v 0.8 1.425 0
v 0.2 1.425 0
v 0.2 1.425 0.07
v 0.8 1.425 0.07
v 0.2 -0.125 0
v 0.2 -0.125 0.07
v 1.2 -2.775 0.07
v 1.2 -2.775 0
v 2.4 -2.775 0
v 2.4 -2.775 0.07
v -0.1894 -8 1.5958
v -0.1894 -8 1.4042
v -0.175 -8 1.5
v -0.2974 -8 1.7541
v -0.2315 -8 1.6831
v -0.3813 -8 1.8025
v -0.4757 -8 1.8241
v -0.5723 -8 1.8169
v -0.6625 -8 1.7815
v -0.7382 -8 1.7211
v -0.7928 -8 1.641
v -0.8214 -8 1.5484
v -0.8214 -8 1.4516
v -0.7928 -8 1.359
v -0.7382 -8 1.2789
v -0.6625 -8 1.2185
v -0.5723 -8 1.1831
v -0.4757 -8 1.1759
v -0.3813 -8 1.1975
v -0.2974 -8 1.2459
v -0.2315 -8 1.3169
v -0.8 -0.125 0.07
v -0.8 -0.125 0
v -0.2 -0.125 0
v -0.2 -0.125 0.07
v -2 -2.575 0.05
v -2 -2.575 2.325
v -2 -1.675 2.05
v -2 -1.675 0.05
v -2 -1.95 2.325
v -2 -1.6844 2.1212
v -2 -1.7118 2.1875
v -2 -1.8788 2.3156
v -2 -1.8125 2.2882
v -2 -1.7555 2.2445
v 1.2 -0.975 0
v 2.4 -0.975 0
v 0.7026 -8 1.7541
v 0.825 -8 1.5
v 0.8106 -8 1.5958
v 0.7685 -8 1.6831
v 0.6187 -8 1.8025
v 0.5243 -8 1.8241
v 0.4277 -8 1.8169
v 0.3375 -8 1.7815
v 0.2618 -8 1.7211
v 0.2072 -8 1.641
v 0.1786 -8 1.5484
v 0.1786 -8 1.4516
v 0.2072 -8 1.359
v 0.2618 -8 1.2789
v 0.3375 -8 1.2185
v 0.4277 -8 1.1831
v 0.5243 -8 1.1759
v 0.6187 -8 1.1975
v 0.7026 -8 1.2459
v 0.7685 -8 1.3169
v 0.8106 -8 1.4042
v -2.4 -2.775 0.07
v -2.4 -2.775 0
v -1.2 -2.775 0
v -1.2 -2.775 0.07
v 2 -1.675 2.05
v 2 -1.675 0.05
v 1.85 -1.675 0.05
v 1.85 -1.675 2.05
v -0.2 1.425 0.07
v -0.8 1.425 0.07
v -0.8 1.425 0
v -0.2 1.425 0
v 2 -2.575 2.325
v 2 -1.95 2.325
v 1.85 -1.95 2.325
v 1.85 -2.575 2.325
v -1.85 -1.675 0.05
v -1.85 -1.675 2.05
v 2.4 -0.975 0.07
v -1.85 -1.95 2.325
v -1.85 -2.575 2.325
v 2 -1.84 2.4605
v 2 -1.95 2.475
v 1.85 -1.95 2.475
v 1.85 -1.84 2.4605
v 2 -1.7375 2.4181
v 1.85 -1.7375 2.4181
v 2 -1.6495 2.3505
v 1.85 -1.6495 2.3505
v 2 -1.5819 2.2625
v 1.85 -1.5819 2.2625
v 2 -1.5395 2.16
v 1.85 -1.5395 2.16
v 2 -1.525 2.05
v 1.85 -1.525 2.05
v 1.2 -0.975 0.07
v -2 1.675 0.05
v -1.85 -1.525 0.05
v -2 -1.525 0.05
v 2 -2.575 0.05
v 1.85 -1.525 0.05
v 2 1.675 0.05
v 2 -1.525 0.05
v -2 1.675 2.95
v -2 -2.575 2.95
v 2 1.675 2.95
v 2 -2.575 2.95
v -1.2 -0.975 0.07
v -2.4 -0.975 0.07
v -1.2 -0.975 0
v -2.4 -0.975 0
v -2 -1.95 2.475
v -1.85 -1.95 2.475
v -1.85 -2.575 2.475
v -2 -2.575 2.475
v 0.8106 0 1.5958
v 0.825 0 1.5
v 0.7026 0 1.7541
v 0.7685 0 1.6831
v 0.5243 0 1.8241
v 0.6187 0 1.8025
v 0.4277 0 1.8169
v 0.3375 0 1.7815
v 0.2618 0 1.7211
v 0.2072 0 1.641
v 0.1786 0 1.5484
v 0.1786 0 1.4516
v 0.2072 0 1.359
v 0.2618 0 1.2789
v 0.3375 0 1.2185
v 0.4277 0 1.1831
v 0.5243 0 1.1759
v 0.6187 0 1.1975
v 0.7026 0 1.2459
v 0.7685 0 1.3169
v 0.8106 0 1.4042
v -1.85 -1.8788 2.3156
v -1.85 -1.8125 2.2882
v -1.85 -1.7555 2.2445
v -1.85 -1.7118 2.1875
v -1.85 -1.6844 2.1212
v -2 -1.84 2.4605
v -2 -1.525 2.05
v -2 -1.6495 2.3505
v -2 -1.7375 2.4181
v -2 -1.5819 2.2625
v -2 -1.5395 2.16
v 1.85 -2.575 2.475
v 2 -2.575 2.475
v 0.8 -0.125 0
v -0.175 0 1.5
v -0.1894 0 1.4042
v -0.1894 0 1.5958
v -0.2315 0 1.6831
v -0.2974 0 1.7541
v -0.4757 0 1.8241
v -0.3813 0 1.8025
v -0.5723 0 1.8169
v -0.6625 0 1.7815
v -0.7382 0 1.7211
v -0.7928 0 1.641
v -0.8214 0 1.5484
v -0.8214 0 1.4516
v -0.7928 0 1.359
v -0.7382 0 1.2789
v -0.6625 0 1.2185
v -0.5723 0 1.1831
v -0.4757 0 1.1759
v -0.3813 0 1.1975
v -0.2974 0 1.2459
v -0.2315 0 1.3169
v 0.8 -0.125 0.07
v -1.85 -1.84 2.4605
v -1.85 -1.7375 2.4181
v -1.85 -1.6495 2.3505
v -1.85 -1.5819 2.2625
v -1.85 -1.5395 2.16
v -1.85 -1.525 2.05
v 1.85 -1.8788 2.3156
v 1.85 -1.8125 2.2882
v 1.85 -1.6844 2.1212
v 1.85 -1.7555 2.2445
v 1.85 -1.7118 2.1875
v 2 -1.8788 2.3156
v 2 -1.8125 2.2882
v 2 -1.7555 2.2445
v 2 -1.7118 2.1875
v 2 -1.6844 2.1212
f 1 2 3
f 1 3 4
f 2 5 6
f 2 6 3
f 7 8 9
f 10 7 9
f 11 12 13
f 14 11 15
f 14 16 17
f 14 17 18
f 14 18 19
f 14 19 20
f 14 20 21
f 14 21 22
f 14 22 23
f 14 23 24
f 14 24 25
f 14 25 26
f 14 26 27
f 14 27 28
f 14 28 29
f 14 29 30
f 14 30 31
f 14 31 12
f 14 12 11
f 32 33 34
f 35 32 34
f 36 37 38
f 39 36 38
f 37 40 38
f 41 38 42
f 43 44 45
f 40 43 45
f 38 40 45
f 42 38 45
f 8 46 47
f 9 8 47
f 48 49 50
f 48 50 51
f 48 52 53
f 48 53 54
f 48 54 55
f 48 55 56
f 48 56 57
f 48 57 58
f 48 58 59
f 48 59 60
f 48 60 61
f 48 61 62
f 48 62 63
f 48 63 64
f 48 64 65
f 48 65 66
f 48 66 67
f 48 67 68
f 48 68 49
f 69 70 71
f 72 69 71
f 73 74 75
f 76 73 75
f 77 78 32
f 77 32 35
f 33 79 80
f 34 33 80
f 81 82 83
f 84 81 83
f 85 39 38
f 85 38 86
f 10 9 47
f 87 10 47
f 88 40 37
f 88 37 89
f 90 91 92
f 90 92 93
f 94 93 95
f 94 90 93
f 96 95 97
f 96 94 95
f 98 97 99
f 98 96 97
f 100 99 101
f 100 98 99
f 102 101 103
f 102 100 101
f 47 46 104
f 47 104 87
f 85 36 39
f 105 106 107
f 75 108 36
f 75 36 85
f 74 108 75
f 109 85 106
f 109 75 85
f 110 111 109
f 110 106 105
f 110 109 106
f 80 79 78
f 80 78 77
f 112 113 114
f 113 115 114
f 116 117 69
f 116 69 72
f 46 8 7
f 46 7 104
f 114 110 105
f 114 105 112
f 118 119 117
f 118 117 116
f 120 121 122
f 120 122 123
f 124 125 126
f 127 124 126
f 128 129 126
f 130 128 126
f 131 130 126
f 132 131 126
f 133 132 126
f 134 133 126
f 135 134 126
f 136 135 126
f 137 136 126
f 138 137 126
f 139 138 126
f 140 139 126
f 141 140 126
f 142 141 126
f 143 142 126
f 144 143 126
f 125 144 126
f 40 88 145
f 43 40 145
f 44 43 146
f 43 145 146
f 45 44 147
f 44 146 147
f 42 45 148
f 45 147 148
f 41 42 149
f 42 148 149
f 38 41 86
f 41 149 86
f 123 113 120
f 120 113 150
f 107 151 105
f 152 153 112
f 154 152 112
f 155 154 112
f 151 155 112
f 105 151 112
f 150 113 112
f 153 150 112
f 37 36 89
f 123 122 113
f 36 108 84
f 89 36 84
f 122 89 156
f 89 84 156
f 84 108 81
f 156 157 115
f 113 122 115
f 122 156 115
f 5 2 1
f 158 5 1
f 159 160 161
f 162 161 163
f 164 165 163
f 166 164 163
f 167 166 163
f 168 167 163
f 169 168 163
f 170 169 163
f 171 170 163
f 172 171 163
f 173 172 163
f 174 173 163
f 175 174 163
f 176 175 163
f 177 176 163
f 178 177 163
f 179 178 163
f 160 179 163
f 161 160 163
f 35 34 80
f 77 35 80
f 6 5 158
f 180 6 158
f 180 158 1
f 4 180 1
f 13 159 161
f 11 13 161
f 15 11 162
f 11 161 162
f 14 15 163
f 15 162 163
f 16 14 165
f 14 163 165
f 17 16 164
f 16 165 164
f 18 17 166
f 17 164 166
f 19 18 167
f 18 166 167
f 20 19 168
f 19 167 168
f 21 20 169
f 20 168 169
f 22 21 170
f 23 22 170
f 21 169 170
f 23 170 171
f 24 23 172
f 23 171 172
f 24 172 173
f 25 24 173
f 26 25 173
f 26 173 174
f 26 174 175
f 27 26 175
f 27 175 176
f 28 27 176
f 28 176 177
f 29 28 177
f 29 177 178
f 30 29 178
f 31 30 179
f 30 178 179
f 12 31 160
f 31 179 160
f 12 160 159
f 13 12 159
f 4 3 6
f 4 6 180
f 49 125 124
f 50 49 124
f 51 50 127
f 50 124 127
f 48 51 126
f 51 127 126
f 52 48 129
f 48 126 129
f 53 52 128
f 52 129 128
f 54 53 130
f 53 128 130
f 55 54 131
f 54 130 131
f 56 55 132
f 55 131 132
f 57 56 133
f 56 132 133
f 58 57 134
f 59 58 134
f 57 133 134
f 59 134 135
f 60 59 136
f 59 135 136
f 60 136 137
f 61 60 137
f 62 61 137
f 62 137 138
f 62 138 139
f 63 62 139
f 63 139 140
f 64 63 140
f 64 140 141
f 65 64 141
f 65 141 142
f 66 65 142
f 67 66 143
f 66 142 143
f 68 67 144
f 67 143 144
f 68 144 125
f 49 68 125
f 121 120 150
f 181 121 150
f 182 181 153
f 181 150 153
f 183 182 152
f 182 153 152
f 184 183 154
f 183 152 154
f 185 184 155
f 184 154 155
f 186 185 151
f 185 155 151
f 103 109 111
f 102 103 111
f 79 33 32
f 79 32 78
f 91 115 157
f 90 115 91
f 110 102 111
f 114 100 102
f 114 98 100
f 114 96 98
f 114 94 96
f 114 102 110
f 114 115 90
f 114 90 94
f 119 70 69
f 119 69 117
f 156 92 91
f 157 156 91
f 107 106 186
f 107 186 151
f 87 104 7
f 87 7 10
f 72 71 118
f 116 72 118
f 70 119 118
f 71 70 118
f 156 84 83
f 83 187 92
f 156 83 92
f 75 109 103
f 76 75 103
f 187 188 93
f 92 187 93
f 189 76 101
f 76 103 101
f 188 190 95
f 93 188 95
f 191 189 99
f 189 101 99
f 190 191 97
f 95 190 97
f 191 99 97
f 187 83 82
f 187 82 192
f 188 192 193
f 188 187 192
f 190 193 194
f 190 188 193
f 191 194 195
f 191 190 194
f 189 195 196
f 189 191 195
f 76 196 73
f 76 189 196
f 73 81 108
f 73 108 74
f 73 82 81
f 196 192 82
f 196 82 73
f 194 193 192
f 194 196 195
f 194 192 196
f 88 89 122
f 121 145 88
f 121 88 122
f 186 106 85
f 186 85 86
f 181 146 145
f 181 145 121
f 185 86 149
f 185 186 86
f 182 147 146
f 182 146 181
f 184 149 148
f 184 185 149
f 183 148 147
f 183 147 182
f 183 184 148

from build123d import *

# Parameters (mm, degrees)
SKETCH_W     = 4.25
SKETCH_H     = 2.9
PAD_DEPTH    = 2
SKETCH004_W  = 0.25
SKETCH004_H  = 0.15
SKETCH001_R  = 0.325
PAD001_DEPTH = 8
SKETCH002_R  = 0.325
PAD002_DEPTH = 8
SKETCH005_W  = 1.2
SKETCH005_H  = 1.8
PAD003_DEPTH = 0.07
SKETCH006_W  = 0.6
SKETCH006_H  = 1.55
PAD004_DEPTH = 0.07
SKETCH007_W  = 0.6
SKETCH007_H  = 1.55
PAD005_DEPTH = 0.07
SKETCH008_W  = 1.2
SKETCH008_H  = 1.8
PAD006_DEPTH = 0.07


with BuildPart() as housing:
    # Sketch → Pad (new body, symmetric)
    with BuildSketch(Plane.YZ):
        with Locations((-0.45, 1.5)):
            Rectangle(SKETCH_W, SKETCH_H)
    extrude(amount=PAD_DEPTH, both=True)

    # SubtractivePipe: sweep along a path in Sketch003
    with BuildLine(Plane.YZ) as subtractivepipe_path:
        Line((-3, 2.4), (-1.95, 2.4))
        ThreePointArc((-1.95, 2.4), (-1.702513, 2.297487), (-1.6, 2.05))
        Line((-1.6, 2.05), (-1.6, 0))
    # Sketch004 → SubtractivePipe (sweep, cut)
    with BuildSketch(Plane.XY):
        with Locations((-1.975, -1.6)):
            Rectangle(SKETCH004_W, SKETCH004_H)
    subtractivepipe = sweep(path=subtractivepipe_path.line, mode=Mode.SUBTRACT)

    # Mirrored: SubtractivePipe across YZ
    add(subtractivepipe.mirror(Plane.YZ), mode=Mode.SUBTRACT)


with BuildPart() as body001:
    # Sketch001 → Pad001 (new body)
    with BuildSketch(Plane.XZ):
        with Locations((-0.5, 1.5)):
            Circle(SKETCH001_R)
    extrude(amount=PAD001_DEPTH)


with BuildPart() as body002:
    # Sketch002 → Pad002 (new body)
    with BuildSketch(Plane.XZ):
        with Locations((-0.5, 1.5)):
            Circle(SKETCH002_R)
    extrude(amount=PAD002_DEPTH)


with BuildPart() as body002_1:
    # Body002 placement: moved
    add(body002.part.moved(Location((1, 0, 0))))


with BuildPart() as pad1:
    # Sketch005 → Pad003 (new body)
    with BuildSketch(Plane.XY):
        with Locations((-1.8, -1.875)):
            Rectangle(SKETCH005_W, SKETCH005_H)
    extrude(amount=PAD003_DEPTH)


with BuildPart() as pad2:
    # Sketch006 → Pad004 (new body)
    with BuildSketch(Plane.XY):
        with Locations((-0.5, 0.65)):
            Rectangle(SKETCH006_W, SKETCH006_H)
    extrude(amount=PAD004_DEPTH)


with BuildPart() as pad3:
    # Sketch007 → Pad005 (new body)
    with BuildSketch(Plane.XY):
        with Locations((0.5, 0.65)):
            Rectangle(SKETCH007_W, SKETCH007_H)
    extrude(amount=PAD005_DEPTH)


with BuildPart() as pad4:
    # Sketch008 → Pad006 (new body)
    with BuildSketch(Plane.XY):
        with Locations((1.8, -1.875)):
            Rectangle(SKETCH008_W, SKETCH008_H)
    extrude(amount=PAD006_DEPTH)


solid = Compound([housing.part, body001.part, body002_1.part, pad1.part, pad2.part, pad3.part, pad4.part])
